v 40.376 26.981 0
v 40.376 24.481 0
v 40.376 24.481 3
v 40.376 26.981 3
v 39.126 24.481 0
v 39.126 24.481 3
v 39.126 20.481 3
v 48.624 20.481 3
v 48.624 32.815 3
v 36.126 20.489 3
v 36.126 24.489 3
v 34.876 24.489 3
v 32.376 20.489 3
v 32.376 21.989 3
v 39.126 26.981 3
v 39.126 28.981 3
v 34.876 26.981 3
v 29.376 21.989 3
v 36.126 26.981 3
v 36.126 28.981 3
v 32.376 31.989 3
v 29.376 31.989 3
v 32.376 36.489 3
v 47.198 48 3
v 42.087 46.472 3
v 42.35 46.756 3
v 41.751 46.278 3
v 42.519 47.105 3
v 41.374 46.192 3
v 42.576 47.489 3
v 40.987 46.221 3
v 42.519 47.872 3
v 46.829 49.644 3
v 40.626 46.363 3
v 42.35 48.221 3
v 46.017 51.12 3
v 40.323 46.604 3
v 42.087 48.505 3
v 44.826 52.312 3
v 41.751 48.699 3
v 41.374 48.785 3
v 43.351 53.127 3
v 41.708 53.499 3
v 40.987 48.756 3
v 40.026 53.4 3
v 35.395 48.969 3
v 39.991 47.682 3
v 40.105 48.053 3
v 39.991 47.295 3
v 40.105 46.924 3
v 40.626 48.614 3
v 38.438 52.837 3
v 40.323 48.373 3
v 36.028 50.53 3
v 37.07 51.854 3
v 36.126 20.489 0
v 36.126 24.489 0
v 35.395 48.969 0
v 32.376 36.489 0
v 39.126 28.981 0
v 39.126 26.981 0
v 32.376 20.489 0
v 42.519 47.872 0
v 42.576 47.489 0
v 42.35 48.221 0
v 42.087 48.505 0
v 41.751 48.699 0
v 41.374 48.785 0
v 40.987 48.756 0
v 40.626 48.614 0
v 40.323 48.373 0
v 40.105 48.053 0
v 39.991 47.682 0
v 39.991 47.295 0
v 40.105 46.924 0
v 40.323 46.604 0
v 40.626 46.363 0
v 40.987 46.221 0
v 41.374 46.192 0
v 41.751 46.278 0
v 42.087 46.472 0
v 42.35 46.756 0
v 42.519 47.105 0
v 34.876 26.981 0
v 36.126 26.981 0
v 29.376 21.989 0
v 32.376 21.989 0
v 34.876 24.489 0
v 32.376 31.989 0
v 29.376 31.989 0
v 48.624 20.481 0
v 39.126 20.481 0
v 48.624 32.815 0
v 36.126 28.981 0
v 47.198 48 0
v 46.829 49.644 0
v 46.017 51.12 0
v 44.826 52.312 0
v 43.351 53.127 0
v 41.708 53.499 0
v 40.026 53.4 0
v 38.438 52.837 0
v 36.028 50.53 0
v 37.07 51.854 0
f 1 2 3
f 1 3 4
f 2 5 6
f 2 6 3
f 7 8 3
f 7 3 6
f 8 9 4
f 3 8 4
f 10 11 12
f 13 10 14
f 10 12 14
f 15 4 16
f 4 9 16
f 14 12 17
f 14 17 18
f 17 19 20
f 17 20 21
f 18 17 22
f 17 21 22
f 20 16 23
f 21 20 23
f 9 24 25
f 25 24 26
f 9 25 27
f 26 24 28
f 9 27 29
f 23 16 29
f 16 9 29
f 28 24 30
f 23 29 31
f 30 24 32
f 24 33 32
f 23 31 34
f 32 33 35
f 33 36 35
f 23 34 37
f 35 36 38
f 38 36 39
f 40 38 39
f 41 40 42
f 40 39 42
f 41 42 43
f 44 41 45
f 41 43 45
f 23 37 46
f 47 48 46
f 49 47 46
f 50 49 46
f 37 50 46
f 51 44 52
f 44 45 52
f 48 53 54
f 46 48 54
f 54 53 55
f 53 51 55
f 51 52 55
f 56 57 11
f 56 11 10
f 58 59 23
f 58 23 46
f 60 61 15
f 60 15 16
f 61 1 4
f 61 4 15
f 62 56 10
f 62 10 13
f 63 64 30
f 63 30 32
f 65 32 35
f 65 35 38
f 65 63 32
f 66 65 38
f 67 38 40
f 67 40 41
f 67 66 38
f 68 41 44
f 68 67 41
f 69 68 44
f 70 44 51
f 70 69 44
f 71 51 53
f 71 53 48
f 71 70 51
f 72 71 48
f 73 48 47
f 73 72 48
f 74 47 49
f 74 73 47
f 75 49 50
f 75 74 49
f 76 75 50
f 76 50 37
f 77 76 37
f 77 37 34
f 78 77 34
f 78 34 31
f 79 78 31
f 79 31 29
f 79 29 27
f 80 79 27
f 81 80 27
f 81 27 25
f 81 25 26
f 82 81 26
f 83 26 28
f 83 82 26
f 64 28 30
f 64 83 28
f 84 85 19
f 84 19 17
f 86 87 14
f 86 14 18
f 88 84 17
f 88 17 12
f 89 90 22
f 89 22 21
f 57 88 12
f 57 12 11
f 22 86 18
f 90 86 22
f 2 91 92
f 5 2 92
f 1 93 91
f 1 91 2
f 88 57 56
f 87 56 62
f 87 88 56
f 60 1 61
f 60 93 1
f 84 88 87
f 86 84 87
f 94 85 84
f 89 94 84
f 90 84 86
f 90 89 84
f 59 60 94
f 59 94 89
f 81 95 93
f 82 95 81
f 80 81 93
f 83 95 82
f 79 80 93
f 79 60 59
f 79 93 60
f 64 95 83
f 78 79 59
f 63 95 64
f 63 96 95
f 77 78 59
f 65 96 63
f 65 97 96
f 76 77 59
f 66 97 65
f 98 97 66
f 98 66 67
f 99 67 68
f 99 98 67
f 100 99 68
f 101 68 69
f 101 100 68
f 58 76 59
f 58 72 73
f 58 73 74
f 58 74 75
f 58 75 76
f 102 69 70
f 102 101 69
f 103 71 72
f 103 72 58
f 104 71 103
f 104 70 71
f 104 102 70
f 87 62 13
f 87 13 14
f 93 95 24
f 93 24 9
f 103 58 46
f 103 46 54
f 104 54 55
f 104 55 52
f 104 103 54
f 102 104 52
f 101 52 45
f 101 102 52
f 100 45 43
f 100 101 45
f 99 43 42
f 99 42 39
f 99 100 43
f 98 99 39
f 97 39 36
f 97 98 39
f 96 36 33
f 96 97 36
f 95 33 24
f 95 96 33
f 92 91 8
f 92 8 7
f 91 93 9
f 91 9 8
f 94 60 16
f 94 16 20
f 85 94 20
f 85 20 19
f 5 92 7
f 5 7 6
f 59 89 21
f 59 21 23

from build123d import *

# Parameters (mm, degrees)
MODEL_R             = 1.3
BOSS_EXTRUDE1_DEPTH = 3


with BuildPart() as part:
    # Model → Boss-Extrude1 (new body)
    with BuildSketch(Plane.XY):
        with BuildLine():
            Line((48.62361742, 20.481068056), (39.12638258, 20.481068056))
            Line((39.12638258, 20.481068056), (39.12638258, 24.481068056))
            Line((39.12638258, 24.481068056), (40.37638258, 24.481068056))
            Line((40.37638258, 24.481068056), (40.37638258, 26.981068056))
            Line((40.37638258, 26.981068056), (39.12638258, 26.981068056))
            Line((39.12638258, 26.981068056), (39.12638258, 28.981068056))
            Line((39.12638258, 28.981068056), (36.12638258, 28.981068056))
            Line((36.12638258, 28.981068056), (36.12638258, 26.981068056))
            Line((36.12638258, 26.981068056), (34.87638258, 26.981068056))
            Line((34.87638258, 26.981068056), (34.87638258, 24.488530086))
            Line((34.87638258, 24.488530086), (36.12638258, 24.488530086))
            Line((36.12638258, 24.488530086), (36.12638258, 20.488530086))
            Line((36.12638258, 20.488530086), (32.37638258, 20.488530086))
            Line((32.37638258, 20.488530086), (32.37638258, 21.988530086))
            Line((32.37638258, 21.988530086), (29.37638258, 21.988530086))
            Line((29.37638258, 21.988530086), (29.37638258, 31.988530086))
            Line((29.37638258, 31.988530086), (32.37638258, 31.988530086))
            Line((32.37638258, 31.988530086), (32.37638258, 36.488530086))
            Line((32.37638258, 36.488530086), (35.395249636, 48.968623875))
            ThreePointArc((35.395249636, 48.968623875), (41.708225131, 53.498846113), (47.198169486, 48.000020412))
            Line((47.198169486, 48.000020412), (48.62361742, 32.814680991))
            Line((48.62361742, 32.814680991), (48.62361742, 20.481068056))
        make_face()
        with Locations((41.27638258, 47.488530086)):
            Circle(MODEL_R, mode=Mode.SUBTRACT)
    extrude(amount=BOSS_EXTRUDE1_DEPTH)


solid = part.part
